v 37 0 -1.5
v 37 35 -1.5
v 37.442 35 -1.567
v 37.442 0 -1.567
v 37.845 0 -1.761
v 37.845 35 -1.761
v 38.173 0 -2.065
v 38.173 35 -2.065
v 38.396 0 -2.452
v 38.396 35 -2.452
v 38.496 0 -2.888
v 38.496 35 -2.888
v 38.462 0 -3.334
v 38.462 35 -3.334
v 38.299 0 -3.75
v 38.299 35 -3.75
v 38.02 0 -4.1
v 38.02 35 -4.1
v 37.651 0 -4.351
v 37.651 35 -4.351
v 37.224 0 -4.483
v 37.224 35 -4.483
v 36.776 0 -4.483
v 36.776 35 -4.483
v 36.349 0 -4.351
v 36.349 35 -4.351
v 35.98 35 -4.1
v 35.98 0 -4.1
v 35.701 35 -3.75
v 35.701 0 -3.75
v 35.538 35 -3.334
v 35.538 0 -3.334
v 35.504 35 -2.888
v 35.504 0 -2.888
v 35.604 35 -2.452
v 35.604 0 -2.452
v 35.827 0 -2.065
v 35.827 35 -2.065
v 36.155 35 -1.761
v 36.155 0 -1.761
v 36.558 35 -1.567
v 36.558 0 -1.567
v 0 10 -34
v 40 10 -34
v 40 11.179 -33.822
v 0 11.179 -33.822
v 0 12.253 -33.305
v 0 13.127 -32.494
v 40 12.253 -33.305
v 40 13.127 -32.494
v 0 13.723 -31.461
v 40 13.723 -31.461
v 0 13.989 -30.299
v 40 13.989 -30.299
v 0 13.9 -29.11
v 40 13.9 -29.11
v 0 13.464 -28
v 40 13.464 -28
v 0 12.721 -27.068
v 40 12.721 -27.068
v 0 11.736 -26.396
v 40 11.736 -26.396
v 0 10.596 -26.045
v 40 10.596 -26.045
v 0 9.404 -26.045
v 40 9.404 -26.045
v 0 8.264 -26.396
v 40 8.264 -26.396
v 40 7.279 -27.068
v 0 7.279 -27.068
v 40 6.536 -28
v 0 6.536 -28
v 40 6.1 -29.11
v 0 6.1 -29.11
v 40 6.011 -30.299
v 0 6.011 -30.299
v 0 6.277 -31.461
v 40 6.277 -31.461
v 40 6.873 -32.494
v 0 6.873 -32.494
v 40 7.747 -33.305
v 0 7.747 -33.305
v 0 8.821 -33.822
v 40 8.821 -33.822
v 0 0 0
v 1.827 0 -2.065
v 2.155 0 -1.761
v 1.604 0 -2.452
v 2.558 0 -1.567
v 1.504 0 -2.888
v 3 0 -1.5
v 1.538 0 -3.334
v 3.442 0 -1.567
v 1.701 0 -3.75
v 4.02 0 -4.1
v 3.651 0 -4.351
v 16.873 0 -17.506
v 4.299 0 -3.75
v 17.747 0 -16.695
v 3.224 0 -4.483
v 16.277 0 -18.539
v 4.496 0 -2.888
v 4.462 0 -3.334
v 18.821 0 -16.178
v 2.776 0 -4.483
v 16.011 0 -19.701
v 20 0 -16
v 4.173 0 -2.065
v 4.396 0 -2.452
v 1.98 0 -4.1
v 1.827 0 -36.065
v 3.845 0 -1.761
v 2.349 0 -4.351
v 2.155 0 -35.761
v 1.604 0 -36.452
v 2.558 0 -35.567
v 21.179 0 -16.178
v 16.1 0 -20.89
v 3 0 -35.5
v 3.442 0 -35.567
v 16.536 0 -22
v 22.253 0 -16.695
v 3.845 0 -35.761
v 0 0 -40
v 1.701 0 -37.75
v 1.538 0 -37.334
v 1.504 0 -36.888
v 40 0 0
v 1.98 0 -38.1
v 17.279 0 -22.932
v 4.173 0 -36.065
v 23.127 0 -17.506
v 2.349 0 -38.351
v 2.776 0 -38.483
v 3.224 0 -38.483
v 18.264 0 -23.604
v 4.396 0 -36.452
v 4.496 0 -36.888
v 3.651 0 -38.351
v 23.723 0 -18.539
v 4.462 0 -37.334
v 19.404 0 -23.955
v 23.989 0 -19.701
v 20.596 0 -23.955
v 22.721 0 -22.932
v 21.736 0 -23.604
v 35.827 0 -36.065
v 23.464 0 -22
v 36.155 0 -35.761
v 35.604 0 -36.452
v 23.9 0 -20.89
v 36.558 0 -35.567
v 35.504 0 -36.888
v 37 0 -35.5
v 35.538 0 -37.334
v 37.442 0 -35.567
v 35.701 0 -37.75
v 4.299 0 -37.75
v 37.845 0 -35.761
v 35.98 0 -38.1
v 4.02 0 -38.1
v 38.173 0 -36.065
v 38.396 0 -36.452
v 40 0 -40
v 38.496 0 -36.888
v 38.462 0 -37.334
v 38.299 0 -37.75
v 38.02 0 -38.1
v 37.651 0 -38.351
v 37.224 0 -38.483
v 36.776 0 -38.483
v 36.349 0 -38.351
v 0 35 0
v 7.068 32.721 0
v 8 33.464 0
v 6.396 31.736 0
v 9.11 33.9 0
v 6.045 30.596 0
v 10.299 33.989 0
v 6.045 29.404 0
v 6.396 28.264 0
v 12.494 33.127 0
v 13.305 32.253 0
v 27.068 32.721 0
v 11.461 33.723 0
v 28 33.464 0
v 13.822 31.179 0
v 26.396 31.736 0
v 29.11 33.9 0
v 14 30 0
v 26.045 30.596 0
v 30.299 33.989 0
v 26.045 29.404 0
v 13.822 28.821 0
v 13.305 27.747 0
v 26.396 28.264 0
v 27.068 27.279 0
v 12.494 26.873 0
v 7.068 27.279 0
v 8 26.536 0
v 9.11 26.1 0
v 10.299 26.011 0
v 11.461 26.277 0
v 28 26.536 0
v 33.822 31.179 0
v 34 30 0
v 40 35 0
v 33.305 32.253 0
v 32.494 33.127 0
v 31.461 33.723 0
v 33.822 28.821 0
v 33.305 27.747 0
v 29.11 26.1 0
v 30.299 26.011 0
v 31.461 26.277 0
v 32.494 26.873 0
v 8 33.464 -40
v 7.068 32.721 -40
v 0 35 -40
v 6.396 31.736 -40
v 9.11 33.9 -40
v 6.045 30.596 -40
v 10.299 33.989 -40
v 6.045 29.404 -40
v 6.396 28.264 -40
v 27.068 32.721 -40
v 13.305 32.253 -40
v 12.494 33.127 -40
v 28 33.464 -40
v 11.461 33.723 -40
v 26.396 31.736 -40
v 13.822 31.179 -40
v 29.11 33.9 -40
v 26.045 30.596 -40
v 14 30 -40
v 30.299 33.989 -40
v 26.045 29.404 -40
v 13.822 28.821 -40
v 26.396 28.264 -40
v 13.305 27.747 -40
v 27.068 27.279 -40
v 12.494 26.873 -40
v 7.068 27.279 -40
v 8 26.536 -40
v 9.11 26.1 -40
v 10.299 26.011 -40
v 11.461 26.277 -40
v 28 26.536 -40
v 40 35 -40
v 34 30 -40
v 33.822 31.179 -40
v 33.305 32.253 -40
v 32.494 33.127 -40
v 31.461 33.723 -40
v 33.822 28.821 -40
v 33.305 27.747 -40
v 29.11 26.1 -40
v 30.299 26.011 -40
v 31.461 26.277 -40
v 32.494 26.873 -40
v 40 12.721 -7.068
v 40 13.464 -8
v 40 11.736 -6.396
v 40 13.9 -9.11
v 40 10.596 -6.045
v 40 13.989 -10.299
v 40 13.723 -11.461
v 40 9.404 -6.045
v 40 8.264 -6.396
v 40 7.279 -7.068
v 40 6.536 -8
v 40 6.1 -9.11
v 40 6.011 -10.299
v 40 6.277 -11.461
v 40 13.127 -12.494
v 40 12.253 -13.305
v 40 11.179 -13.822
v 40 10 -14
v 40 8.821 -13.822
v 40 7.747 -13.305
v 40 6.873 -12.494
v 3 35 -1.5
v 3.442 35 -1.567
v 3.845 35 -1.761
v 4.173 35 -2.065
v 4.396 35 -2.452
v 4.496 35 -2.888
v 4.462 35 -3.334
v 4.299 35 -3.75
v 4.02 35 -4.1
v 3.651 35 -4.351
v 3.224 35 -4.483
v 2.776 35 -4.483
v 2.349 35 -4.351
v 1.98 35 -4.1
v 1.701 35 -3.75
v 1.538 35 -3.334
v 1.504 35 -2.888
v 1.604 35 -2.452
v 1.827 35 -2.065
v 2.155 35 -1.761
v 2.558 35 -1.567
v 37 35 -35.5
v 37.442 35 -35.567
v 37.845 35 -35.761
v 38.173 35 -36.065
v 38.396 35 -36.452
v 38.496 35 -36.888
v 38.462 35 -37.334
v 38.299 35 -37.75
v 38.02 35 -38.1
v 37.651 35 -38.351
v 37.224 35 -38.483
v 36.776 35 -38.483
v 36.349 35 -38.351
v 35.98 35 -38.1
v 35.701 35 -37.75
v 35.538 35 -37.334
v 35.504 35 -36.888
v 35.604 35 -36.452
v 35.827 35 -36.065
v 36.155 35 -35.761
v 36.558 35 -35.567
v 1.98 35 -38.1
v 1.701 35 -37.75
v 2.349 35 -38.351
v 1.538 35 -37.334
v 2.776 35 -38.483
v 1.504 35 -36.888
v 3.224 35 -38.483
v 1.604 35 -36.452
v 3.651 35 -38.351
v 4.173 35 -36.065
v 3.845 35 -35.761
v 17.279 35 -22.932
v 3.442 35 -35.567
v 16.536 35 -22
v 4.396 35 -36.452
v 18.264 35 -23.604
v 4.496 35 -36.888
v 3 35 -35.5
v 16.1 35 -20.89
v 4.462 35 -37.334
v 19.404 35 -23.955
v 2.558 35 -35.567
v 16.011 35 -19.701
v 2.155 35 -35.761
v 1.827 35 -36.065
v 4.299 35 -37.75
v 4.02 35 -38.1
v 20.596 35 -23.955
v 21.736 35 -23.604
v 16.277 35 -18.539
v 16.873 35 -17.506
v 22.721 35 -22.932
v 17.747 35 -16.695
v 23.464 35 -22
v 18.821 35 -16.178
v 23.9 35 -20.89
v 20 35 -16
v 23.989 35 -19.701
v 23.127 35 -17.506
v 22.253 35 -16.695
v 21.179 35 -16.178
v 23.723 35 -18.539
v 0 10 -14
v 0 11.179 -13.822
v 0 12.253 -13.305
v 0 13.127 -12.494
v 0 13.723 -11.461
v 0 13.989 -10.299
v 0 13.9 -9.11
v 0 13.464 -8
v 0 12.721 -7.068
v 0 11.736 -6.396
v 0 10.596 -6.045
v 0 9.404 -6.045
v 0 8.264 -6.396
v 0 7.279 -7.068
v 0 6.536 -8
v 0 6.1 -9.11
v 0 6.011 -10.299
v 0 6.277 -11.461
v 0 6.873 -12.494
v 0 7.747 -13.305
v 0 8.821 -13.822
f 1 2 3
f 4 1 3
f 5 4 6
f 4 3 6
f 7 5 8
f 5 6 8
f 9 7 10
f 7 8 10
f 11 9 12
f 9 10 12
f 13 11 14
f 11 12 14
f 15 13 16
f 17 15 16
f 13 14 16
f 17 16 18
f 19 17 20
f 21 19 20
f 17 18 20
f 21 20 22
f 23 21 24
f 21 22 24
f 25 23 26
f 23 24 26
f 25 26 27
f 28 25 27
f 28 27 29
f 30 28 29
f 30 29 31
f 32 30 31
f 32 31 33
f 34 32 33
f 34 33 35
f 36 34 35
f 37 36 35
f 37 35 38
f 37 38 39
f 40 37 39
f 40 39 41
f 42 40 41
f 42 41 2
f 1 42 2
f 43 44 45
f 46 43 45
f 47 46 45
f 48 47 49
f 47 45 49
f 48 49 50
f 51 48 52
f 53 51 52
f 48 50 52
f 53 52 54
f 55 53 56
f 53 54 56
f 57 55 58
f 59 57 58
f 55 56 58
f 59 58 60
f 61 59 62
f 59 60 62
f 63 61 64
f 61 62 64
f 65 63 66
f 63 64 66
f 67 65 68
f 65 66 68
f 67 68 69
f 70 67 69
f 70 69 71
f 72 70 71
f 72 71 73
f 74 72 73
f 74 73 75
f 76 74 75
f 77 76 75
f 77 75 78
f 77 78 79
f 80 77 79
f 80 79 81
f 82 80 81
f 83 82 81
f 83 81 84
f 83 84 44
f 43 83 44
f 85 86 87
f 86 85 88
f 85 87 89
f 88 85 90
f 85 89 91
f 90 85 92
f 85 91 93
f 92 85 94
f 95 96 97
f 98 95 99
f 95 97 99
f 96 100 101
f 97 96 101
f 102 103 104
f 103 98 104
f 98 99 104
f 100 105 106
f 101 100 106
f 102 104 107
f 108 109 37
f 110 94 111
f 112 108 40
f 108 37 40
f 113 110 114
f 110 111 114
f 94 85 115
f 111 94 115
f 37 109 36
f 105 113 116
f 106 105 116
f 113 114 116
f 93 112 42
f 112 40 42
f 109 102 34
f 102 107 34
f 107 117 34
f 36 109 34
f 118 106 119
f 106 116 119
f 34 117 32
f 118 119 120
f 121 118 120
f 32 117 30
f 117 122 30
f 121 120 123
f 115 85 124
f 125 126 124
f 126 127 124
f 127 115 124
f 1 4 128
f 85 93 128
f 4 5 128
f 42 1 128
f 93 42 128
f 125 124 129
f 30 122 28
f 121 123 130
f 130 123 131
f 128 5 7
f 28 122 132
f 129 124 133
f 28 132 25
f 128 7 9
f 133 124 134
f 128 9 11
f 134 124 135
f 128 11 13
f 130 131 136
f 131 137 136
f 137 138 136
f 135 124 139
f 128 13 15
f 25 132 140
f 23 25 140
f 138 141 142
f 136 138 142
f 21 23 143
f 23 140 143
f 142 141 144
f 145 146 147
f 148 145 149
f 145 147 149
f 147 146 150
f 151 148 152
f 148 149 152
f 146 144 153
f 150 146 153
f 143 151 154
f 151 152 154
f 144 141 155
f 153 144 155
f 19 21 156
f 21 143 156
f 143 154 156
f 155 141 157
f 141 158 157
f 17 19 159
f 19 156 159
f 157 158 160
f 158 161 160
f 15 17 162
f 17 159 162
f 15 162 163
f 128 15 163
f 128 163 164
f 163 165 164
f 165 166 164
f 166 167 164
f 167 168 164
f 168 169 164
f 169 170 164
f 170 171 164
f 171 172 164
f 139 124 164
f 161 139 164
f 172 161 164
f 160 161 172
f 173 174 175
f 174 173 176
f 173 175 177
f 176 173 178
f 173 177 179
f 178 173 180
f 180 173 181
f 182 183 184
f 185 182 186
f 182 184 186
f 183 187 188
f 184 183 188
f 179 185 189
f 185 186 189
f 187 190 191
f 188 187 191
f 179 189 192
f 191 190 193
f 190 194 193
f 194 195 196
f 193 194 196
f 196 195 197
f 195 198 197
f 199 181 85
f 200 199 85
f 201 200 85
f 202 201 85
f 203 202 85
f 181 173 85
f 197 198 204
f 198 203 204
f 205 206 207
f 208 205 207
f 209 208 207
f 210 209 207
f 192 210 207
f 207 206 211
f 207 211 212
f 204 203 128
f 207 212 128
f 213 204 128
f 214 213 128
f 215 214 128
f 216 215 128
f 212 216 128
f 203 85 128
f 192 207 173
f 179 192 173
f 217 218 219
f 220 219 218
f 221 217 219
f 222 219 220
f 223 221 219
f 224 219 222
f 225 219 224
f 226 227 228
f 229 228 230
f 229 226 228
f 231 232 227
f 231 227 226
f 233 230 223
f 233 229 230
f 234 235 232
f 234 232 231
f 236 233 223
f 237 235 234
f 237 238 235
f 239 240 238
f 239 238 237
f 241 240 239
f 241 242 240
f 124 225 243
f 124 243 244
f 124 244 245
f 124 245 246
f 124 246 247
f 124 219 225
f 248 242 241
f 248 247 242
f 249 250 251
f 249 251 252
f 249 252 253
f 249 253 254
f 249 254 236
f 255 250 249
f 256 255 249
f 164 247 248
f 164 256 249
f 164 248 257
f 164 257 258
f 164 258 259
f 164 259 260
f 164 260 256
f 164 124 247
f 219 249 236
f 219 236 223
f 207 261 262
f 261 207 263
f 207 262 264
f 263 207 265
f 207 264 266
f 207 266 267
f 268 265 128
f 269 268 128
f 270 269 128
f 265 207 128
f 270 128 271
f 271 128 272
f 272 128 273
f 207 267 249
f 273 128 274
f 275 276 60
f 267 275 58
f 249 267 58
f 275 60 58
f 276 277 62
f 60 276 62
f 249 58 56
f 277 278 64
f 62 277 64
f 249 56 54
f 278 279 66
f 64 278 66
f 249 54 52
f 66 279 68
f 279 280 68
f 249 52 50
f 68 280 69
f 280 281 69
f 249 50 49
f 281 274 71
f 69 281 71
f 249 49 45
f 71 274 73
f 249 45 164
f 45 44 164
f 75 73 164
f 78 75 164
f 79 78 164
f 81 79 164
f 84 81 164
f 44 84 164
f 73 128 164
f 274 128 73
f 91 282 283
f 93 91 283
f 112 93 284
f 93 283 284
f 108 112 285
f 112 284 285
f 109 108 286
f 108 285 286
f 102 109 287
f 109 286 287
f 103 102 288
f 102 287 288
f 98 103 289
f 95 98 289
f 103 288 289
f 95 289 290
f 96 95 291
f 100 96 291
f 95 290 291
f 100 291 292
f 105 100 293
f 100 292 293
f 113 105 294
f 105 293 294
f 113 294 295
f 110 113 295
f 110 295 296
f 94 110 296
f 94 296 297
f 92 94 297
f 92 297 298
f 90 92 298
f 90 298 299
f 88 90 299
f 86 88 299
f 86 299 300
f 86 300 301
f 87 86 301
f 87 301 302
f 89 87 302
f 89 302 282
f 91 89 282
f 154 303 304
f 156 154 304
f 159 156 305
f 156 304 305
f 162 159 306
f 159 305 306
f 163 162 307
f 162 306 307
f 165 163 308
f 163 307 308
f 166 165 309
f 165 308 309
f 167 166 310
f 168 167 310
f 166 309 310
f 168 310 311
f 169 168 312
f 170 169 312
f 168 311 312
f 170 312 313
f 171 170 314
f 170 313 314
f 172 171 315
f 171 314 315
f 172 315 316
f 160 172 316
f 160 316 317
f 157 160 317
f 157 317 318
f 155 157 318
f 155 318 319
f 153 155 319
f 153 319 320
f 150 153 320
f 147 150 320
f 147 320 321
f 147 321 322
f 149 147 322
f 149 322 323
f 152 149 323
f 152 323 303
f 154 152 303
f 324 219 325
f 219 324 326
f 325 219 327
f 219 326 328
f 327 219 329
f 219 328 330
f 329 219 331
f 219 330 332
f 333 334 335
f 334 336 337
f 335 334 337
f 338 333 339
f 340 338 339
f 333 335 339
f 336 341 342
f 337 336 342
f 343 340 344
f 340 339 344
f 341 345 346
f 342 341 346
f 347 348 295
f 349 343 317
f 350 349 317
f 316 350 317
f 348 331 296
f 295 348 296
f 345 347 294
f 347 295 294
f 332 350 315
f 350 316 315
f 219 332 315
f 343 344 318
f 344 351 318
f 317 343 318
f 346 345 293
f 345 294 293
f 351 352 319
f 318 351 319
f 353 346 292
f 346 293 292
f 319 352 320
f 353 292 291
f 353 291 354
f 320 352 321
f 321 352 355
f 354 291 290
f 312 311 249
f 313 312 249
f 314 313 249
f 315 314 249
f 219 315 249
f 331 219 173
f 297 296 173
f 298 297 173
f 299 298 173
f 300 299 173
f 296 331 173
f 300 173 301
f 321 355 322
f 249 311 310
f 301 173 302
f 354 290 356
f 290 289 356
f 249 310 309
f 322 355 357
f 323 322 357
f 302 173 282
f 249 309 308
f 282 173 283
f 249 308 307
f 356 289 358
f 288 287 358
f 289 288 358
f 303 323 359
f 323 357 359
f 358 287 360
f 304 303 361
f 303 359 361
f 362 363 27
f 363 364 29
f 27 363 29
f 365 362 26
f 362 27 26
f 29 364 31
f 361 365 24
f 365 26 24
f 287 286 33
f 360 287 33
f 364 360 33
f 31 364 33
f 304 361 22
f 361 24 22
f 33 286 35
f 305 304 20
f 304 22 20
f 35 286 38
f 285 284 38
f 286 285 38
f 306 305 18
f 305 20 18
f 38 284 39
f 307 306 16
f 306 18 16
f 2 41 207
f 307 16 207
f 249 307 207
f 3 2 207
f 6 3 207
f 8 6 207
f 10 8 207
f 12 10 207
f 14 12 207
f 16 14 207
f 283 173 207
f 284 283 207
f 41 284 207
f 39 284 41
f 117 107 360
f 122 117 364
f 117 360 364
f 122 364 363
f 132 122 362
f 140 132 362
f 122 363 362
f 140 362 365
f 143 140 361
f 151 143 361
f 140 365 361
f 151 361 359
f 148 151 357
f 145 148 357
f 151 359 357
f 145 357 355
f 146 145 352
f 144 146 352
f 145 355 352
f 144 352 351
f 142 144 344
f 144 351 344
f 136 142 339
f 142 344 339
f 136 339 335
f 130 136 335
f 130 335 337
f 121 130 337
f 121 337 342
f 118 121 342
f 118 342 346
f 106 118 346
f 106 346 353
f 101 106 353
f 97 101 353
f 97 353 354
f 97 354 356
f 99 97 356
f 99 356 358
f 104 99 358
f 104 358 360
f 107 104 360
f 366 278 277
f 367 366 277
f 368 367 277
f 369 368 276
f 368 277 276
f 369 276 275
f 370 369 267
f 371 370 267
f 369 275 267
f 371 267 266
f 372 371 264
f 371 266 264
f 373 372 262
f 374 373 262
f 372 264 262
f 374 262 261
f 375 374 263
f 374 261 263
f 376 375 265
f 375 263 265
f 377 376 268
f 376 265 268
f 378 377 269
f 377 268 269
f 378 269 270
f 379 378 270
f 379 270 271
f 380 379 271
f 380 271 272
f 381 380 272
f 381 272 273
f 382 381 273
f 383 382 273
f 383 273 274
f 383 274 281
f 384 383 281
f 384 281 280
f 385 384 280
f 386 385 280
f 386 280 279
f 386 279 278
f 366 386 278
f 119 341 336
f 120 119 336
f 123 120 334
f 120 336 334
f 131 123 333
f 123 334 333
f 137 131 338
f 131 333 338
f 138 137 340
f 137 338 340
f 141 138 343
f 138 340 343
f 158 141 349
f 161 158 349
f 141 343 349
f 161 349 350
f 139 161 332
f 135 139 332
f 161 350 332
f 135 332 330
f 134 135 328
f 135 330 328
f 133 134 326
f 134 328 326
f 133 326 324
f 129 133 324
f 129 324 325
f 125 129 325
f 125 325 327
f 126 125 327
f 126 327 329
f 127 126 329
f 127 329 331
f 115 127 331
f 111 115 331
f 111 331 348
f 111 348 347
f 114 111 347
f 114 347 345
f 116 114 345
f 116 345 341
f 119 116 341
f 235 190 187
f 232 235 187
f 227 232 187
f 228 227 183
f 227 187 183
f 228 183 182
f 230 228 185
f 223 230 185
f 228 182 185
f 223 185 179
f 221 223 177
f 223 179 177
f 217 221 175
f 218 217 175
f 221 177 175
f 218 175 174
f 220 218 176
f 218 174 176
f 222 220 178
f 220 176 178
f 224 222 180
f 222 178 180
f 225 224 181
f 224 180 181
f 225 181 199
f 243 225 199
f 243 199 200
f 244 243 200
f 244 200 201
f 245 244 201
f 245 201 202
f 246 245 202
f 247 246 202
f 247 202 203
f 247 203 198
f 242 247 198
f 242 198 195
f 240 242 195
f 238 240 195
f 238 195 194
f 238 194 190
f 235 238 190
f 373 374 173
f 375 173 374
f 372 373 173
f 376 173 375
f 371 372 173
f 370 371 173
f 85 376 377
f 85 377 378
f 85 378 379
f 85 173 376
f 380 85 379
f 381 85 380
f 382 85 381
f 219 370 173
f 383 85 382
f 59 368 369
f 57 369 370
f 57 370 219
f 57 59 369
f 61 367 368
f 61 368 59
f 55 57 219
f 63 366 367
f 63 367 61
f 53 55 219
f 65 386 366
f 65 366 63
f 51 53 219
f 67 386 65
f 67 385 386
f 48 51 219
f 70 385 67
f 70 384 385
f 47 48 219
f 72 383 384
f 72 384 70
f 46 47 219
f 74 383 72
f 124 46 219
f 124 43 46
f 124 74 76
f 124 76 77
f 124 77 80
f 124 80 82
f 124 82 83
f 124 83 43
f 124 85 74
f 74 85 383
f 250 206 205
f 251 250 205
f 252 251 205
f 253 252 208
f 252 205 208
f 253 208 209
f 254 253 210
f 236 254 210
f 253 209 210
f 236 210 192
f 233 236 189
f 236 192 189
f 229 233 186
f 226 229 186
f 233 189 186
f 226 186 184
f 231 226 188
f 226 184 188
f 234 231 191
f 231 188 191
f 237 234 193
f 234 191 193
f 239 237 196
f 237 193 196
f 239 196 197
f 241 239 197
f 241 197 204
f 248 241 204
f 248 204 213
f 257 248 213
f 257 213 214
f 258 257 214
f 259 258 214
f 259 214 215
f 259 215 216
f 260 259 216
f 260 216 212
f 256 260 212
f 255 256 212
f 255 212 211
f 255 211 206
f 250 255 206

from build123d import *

# Parameters (mm, degrees)
SKETCH1_W           = 40
SKETCH1_H           = 40
BOSS_EXTRUDE1_DEPTH = 45
SKETCH2_R           = 4
CUT_EXTRUDE1_DEPTH  = 45
SKETCH3_R           = 4
CUT_EXTRUDE2_DEPTH  = 45
SKETCH4_R           = 4
SKETCH4_R_2         = 1.5
CUT_EXTRUDE13_DEPTH = 45
SKETCH9_W           = 40
SKETCH9_H           = 10
CUT_EXTRUDE18_DEPTH = 45


with BuildPart() as part:
    # Sketch1 → Boss-Extrude1 (new body)
    with BuildSketch(Plane(origin=(0, 0, 0), x_dir=(1, 0, 0), z_dir=(0, 1, 0))):
        with Locations((20, 20)):
            Rectangle(SKETCH1_W, SKETCH1_H)
    extrude(amount=BOSS_EXTRUDE1_DEPTH)

    # Sketch2 → Cut-Extrude1 (cut)
    with BuildSketch(Plane.XY):
        with Locations((10, 30)):
            Circle(SKETCH2_R)
        with Locations((30, 30)):
            Circle(SKETCH2_R)
    extrude(amount=-CUT_EXTRUDE1_DEPTH, mode=Mode.SUBTRACT)

    # Sketch3 → Cut-Extrude2 (cut)
    with BuildSketch(Plane(origin=(40, 0, 0), x_dir=(0, 0, -1), z_dir=(1, 0, 0))):
        with Locations((10, 10)):
            Circle(SKETCH3_R)
        with Locations((30, 10)):
            Circle(SKETCH3_R)
    extrude(amount=-CUT_EXTRUDE2_DEPTH, mode=Mode.SUBTRACT)

    # Sketch4 → Cut-Extrude13 (cut)
    with BuildSketch(Plane(origin=(0, 45, 0), x_dir=(1, 0, 0), z_dir=(0, 1, 0))):
        with Locations(Location((20, 20, 0), (0, 0, 270))):
            Circle(SKETCH4_R)
        with Locations(Location((3, 3, 0), (0, 0, 270))):
            Circle(SKETCH4_R_2)
        with Locations(Location((3, 37, 0), (0, 0, 270))):
            Circle(SKETCH4_R_2)
        with Locations(Location((37, 37, 0), (0, 0, 270))):
            Circle(SKETCH4_R_2)
        with Locations(Location((37, 3, 0), (0, 0, 270))):
            Circle(SKETCH4_R_2)
    extrude(amount=-CUT_EXTRUDE13_DEPTH, mode=Mode.SUBTRACT)

    # Sketch9 → Cut-Extrude18 (cut)
    with BuildSketch(Plane.XY):
        with Locations((20, 40)):
            Rectangle(SKETCH9_W, SKETCH9_H)
    extrude(amount=-CUT_EXTRUDE18_DEPTH, mode=Mode.SUBTRACT)


solid = part.part
